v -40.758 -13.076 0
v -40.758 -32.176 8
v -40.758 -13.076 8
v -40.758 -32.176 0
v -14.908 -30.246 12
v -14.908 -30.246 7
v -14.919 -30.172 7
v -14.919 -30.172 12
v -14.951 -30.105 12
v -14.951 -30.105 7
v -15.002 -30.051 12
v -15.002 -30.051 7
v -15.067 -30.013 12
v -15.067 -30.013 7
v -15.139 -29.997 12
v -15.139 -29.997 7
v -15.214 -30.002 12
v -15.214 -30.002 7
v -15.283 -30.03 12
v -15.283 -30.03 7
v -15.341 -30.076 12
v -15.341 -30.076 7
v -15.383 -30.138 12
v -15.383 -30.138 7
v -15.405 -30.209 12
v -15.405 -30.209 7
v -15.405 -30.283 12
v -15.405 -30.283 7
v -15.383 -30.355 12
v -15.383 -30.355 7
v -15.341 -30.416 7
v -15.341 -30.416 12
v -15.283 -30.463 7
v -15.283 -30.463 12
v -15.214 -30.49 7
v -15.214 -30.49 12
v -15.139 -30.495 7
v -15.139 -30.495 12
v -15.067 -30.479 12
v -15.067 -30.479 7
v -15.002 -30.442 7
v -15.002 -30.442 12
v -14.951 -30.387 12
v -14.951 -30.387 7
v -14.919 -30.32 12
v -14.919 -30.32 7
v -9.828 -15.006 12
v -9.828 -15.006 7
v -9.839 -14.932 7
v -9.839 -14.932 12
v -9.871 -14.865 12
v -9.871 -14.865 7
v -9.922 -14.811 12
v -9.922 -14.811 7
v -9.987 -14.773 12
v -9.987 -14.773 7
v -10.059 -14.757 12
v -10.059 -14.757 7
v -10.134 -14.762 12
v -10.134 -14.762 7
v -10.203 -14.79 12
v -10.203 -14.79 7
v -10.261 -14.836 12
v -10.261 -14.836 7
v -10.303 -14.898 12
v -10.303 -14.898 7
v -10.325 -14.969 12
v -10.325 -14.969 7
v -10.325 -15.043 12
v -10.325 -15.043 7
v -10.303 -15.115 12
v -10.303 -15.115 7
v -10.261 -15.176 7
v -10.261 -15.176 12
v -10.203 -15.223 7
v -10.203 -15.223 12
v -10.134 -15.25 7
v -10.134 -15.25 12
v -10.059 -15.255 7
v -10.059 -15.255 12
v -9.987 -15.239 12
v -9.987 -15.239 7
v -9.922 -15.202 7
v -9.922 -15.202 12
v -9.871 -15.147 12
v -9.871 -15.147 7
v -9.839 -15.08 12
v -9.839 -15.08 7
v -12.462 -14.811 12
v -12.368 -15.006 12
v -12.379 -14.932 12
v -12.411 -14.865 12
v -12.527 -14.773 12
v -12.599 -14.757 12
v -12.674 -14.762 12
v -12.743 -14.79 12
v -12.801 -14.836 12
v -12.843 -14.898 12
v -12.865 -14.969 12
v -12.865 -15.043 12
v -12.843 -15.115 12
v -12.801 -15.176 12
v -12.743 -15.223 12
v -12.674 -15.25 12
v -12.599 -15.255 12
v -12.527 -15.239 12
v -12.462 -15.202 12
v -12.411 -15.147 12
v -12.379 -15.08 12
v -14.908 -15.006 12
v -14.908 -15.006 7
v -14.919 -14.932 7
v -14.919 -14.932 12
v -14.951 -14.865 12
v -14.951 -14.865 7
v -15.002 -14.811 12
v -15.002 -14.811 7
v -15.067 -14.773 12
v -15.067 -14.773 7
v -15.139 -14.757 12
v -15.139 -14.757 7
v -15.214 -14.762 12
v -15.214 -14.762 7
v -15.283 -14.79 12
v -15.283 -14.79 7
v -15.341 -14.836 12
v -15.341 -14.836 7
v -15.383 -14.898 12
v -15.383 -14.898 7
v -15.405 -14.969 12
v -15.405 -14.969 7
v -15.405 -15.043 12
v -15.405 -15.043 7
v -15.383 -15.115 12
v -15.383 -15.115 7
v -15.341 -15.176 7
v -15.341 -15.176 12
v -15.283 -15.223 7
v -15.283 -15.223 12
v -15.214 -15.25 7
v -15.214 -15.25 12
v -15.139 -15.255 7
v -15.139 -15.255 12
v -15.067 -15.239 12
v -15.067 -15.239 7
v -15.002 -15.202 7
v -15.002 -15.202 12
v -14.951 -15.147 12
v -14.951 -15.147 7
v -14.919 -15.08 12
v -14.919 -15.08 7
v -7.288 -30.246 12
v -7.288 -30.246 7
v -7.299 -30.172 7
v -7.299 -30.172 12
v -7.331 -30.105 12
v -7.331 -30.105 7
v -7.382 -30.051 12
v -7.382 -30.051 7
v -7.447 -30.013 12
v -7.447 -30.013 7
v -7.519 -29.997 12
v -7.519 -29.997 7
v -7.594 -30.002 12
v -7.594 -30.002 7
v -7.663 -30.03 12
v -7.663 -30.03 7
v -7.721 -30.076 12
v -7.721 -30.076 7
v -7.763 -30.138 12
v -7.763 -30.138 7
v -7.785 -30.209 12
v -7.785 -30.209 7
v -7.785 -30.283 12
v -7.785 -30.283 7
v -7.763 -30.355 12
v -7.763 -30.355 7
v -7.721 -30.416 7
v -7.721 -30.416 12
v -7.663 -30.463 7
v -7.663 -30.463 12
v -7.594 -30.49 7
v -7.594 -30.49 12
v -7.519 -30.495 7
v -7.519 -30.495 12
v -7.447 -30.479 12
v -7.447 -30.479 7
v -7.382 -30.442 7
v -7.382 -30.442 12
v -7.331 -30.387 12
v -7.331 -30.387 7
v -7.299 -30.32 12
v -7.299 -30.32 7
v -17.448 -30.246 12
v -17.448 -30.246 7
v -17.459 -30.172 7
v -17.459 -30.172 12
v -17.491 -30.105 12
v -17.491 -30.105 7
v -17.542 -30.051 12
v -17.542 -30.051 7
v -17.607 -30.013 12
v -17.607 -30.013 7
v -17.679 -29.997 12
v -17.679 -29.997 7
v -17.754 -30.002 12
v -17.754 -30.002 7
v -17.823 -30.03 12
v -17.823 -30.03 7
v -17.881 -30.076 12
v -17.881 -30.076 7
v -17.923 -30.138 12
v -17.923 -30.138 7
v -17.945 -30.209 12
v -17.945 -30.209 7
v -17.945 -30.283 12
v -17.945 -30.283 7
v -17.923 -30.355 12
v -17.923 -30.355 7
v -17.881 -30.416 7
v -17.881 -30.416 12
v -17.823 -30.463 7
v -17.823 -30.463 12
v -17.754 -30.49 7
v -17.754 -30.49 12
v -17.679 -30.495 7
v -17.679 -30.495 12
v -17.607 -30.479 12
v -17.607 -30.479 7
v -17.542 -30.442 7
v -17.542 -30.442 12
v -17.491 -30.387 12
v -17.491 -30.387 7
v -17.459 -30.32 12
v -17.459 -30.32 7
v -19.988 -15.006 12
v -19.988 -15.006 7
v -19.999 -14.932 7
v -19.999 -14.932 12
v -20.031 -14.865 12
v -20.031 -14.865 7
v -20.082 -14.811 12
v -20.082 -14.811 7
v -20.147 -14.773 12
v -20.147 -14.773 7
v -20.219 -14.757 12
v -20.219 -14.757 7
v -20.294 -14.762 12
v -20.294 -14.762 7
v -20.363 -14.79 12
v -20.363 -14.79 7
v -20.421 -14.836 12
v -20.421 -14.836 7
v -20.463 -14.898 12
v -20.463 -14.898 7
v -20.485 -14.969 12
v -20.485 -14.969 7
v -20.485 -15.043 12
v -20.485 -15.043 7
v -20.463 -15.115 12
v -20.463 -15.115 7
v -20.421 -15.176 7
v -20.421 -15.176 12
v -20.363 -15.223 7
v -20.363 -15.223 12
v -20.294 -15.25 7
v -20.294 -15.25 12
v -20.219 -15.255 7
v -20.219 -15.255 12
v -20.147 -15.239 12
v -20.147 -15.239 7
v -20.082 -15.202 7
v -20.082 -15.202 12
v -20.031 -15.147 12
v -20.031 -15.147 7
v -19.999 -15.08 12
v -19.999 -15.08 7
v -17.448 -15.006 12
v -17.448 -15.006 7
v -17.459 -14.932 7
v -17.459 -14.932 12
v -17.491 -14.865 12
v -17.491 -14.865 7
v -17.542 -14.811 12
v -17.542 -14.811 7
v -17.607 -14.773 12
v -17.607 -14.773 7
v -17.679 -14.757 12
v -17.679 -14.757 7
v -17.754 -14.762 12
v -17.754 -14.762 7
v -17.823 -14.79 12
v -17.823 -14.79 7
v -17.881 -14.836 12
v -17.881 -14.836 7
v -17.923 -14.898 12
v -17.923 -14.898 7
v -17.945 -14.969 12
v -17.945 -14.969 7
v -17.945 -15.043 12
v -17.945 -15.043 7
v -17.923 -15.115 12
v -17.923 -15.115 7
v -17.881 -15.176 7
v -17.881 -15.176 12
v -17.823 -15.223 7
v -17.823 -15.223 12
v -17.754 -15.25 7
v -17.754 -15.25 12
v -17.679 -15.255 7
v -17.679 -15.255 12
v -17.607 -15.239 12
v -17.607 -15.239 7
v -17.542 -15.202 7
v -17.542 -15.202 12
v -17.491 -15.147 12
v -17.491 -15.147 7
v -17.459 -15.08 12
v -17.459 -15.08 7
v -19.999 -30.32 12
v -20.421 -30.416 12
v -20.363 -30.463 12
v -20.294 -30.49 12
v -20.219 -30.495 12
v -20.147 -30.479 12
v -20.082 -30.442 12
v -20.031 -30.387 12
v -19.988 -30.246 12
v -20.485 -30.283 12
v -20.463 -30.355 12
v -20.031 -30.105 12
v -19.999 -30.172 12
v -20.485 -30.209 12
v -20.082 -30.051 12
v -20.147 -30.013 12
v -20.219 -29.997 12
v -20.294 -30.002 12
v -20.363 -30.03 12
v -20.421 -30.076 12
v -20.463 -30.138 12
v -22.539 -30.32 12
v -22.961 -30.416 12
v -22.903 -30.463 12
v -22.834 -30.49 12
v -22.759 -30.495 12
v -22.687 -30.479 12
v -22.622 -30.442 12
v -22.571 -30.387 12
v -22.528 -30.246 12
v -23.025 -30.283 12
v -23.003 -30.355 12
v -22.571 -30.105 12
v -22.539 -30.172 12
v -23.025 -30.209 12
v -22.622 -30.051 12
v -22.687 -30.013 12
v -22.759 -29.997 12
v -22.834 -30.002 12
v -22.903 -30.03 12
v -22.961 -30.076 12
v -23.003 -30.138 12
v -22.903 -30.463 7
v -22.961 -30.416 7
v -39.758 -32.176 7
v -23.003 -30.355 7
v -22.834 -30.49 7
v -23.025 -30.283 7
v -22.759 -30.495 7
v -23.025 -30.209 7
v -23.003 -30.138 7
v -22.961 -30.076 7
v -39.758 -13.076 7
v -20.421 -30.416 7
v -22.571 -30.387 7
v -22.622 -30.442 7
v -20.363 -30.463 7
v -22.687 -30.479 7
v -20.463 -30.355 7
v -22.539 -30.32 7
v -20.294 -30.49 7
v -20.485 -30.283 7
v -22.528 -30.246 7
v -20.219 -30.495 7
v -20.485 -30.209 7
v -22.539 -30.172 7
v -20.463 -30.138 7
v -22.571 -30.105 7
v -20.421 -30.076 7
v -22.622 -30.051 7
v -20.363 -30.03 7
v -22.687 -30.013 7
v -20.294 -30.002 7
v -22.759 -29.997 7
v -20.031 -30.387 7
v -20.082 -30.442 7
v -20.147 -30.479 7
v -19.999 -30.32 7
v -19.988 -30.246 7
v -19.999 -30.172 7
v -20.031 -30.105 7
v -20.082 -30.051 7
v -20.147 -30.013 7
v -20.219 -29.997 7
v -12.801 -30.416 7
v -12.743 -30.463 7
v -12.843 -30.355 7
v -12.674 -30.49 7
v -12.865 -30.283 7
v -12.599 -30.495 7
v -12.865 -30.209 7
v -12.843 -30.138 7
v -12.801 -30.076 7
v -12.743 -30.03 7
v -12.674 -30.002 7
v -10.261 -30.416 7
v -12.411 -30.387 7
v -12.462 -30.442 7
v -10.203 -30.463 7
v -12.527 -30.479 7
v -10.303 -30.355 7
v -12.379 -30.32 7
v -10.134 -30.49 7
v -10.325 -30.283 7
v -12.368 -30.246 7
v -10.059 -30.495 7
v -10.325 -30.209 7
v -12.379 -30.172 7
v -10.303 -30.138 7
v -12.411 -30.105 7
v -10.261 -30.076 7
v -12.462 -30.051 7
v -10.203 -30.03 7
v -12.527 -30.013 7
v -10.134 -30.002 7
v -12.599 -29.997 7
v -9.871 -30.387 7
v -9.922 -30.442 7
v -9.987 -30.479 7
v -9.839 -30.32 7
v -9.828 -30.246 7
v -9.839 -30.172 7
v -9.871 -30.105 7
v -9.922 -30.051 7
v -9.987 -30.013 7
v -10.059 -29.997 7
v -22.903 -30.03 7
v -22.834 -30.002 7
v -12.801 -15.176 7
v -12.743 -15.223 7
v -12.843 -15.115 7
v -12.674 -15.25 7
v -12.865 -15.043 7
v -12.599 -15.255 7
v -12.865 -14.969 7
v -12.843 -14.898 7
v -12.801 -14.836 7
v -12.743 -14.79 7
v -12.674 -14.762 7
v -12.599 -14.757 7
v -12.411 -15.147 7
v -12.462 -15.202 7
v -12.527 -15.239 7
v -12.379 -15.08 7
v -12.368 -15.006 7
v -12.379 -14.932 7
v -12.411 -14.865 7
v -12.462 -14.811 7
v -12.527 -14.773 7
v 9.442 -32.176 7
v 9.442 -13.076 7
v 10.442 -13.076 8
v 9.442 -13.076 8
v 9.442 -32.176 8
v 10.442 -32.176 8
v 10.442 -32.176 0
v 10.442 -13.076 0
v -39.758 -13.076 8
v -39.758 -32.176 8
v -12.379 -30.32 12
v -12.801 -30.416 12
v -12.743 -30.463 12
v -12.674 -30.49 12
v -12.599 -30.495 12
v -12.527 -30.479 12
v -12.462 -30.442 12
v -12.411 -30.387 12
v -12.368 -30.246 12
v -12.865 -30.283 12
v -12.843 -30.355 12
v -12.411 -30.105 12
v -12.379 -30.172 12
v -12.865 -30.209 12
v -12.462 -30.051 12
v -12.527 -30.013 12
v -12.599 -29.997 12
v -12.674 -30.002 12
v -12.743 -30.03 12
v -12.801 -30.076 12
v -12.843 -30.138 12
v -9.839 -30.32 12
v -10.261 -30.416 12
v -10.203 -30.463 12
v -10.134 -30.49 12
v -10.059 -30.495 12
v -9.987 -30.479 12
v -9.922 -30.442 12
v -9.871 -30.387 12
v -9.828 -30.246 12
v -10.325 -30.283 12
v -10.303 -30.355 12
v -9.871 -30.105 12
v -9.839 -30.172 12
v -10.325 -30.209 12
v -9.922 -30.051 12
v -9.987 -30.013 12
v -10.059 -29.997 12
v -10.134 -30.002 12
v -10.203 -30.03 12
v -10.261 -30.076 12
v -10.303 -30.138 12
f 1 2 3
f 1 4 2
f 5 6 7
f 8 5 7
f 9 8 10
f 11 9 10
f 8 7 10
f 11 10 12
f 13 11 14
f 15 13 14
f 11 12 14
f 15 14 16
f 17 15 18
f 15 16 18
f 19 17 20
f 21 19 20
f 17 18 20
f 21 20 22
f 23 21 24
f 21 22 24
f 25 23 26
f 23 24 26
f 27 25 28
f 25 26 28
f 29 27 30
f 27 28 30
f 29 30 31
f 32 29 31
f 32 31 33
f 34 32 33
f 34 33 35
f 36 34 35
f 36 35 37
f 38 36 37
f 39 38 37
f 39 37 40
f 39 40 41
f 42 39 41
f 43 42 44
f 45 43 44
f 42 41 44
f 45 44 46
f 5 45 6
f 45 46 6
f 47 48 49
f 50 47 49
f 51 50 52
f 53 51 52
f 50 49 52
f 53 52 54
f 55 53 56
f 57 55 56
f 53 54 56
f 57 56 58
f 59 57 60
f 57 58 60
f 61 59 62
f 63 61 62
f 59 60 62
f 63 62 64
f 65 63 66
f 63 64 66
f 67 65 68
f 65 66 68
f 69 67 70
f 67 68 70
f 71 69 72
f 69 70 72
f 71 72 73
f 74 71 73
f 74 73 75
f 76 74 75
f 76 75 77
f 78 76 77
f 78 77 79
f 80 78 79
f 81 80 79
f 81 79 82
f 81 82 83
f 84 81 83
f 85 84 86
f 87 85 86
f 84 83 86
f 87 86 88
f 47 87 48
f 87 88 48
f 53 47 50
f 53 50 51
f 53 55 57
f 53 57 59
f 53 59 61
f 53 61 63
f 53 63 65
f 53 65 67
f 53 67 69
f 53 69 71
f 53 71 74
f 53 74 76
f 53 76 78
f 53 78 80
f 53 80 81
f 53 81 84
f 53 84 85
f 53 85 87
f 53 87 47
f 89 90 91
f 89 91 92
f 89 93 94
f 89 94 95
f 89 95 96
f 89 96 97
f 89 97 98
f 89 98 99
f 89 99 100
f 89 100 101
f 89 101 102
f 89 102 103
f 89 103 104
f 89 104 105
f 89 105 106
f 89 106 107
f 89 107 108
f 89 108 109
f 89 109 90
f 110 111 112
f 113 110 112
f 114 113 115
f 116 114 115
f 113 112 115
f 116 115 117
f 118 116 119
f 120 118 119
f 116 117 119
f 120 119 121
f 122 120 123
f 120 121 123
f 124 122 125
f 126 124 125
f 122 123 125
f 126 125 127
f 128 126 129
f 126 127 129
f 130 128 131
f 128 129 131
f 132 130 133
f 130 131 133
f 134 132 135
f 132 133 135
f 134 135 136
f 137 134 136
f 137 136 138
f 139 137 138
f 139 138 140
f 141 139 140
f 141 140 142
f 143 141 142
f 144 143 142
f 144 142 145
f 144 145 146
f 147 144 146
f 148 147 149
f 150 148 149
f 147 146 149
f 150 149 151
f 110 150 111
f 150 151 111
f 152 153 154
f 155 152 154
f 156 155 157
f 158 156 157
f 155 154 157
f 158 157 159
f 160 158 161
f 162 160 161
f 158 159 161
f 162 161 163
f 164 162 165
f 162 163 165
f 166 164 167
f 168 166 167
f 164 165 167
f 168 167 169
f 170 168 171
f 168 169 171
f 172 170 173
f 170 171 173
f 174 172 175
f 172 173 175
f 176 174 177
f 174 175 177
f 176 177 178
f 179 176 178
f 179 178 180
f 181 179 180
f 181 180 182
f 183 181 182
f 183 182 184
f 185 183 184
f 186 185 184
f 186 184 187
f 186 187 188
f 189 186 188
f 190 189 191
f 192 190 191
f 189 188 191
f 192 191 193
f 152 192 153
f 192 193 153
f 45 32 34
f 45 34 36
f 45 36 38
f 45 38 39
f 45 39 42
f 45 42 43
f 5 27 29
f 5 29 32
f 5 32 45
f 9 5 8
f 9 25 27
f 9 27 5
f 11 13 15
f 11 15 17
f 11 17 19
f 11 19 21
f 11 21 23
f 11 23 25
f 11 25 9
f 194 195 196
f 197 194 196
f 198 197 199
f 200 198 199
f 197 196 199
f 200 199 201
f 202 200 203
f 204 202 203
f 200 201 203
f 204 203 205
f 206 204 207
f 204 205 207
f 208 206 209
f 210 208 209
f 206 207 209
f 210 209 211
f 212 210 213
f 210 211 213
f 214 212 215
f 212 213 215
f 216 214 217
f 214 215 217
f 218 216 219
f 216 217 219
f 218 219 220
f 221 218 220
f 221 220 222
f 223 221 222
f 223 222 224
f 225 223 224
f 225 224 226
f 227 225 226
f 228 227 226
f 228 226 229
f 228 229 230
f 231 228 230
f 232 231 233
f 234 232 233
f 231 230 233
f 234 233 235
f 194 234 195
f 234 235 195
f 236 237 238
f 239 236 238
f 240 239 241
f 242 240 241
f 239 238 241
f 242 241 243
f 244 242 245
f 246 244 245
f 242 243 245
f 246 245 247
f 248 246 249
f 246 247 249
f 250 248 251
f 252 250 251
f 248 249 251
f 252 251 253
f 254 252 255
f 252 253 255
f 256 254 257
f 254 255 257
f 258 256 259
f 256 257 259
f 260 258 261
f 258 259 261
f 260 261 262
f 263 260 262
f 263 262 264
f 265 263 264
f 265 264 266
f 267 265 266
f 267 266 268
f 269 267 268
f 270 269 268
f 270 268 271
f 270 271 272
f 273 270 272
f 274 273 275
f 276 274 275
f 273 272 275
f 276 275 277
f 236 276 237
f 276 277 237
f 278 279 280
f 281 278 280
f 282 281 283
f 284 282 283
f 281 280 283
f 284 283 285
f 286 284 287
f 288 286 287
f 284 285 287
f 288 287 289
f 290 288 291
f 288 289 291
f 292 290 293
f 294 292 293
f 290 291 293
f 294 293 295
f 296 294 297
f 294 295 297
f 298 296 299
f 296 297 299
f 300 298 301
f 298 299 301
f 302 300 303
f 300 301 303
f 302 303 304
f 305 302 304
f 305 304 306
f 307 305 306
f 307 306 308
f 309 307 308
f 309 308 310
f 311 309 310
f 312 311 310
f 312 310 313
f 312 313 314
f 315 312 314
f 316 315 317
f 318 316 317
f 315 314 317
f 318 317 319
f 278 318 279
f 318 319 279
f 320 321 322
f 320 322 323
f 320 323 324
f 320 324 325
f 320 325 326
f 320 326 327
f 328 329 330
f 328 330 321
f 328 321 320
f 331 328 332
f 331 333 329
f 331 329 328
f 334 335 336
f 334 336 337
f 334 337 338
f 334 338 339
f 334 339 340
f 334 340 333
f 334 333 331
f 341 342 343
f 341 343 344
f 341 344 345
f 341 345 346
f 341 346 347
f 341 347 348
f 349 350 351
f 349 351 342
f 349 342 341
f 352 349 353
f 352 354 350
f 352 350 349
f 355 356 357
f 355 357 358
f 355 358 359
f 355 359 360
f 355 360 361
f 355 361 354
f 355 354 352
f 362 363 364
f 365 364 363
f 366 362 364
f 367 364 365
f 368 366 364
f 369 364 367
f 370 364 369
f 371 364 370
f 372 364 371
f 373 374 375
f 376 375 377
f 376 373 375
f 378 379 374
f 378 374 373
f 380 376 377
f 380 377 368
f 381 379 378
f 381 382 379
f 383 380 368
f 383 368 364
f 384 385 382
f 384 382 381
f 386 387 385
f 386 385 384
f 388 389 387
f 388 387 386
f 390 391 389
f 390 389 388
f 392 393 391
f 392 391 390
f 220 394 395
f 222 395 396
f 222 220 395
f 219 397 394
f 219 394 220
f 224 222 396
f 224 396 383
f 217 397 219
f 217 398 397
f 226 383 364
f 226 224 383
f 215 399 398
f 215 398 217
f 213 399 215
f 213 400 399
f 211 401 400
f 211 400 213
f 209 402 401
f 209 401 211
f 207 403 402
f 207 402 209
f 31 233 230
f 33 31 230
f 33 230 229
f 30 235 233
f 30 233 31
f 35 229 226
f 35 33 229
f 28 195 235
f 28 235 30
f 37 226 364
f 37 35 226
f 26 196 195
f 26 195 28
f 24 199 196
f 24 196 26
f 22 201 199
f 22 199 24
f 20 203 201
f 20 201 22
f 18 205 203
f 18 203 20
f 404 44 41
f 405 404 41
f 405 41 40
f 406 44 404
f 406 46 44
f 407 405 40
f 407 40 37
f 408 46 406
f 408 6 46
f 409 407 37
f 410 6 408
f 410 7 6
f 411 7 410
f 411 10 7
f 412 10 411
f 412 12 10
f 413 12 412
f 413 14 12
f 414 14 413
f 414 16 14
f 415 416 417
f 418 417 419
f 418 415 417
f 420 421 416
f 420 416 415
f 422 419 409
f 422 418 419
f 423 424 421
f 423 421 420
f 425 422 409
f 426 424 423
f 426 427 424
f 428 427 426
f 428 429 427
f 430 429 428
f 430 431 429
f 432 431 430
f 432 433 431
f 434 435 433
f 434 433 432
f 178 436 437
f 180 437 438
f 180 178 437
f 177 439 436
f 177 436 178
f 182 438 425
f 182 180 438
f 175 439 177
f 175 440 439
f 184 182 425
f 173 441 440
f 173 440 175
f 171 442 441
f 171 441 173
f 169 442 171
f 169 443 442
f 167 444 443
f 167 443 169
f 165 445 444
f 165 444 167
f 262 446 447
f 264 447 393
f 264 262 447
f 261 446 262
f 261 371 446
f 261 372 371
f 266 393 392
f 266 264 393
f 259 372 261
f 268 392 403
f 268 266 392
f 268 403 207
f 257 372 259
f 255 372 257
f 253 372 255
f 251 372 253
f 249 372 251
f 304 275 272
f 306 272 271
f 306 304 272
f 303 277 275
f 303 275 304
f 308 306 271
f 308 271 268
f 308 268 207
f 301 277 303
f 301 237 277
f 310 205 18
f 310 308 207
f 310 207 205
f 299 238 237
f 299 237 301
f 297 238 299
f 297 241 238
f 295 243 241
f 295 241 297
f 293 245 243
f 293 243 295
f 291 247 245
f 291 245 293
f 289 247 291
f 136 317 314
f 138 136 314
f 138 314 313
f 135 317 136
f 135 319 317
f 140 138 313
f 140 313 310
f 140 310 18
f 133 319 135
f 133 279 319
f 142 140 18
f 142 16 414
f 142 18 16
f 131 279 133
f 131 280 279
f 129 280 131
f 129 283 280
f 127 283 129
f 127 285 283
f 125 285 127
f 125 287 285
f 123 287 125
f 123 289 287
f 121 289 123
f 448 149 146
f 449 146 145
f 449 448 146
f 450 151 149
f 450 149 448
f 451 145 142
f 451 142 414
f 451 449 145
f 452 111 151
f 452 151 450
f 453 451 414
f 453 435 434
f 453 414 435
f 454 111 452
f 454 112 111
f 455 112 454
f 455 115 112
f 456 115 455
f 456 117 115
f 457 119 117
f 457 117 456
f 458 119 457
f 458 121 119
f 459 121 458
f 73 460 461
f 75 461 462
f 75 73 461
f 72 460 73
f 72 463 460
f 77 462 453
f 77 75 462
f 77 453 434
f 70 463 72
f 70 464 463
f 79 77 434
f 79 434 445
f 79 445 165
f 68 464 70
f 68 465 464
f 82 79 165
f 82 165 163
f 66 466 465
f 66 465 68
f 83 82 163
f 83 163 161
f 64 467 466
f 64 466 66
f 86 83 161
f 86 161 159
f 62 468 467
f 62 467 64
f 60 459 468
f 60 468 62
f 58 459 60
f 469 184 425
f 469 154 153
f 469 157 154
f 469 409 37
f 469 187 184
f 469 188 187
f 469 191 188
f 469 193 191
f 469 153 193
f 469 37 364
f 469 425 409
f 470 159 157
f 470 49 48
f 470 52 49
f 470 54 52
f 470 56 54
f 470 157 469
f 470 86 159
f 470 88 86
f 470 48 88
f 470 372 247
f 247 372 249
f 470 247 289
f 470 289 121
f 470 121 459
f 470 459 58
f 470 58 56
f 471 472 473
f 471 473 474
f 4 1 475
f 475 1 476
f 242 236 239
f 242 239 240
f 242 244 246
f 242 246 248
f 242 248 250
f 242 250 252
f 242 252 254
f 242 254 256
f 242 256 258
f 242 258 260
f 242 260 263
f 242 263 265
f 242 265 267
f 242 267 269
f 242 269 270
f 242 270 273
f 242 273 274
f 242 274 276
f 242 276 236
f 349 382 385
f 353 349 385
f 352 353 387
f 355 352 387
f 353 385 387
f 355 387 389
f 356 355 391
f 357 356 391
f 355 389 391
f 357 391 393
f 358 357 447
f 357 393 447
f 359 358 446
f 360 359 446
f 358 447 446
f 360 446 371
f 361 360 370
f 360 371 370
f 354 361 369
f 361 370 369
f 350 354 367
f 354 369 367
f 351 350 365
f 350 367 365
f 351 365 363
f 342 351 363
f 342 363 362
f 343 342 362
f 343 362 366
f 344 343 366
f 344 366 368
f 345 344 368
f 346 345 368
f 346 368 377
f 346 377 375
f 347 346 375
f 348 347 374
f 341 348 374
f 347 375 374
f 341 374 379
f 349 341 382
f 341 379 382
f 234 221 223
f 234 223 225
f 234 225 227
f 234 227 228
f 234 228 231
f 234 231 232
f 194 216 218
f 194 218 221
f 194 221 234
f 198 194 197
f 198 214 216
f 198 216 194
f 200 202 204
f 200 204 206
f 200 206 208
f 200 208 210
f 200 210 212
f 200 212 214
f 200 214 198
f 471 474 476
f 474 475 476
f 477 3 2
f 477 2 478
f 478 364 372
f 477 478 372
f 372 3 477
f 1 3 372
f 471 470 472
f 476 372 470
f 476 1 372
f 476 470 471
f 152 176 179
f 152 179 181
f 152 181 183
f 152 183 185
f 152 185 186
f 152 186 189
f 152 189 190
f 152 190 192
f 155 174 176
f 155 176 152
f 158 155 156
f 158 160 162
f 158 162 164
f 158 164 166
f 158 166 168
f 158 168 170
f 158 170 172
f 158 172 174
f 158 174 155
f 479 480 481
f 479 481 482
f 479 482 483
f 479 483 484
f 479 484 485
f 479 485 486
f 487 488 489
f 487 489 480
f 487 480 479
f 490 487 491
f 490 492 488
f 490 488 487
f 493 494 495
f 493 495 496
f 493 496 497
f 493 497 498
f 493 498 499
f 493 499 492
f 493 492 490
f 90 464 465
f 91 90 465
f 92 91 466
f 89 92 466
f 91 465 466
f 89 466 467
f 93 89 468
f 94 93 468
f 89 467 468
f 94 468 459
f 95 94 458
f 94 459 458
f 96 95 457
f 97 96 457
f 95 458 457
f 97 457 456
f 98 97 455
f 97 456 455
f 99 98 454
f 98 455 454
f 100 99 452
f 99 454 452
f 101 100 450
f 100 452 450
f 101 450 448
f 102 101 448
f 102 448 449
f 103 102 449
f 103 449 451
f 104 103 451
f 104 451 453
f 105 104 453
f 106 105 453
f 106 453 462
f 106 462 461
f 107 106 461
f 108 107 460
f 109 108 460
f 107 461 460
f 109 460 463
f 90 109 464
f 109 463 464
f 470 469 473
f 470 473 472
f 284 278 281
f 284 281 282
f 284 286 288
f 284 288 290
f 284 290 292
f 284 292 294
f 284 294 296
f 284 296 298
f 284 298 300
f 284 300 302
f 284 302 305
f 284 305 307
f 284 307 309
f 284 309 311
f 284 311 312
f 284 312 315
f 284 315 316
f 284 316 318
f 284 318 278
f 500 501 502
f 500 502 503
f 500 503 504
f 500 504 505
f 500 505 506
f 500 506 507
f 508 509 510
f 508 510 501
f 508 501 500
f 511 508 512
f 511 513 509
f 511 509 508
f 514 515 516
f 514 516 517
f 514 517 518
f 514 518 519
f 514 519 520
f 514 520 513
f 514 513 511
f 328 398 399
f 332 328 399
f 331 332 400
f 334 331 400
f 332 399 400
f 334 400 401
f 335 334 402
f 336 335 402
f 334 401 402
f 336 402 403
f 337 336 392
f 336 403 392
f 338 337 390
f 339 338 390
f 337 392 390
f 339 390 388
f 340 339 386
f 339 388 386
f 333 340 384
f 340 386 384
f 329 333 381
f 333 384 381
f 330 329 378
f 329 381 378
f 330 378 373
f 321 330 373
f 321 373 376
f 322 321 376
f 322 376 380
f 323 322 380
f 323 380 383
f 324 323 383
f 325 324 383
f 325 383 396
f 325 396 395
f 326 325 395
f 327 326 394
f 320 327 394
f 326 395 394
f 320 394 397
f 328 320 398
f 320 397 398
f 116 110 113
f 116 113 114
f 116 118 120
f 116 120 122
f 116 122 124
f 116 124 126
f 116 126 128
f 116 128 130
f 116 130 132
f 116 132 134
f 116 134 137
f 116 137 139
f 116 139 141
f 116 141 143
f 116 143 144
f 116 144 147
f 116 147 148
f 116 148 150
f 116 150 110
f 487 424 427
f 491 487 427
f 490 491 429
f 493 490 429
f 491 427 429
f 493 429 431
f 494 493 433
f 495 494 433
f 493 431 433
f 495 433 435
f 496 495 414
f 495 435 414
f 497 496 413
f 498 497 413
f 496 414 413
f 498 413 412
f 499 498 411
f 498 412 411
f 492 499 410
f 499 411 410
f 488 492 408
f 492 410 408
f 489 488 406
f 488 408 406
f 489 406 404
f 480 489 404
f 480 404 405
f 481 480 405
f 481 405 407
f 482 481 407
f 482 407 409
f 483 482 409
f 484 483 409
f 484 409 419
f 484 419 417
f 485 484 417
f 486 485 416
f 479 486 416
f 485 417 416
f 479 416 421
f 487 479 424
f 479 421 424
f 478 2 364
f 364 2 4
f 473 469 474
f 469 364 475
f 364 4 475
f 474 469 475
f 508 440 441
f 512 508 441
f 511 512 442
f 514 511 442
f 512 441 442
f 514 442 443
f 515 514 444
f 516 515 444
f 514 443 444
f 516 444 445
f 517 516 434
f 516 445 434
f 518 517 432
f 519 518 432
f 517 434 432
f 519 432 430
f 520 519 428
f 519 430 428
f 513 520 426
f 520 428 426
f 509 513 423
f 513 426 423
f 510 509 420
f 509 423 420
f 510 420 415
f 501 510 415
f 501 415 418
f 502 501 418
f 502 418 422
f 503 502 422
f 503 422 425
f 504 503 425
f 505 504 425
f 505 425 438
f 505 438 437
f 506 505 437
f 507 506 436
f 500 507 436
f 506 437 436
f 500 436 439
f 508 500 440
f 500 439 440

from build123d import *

# Parameters (mm, degrees)
F0_W     = 51.2
F0_H     = 19.1
F1_DEPTH = 7
F3_W     = 1
F3_H     = 19.1
F4_DEPTH = 1
F5_W     = 1
F5_H     = 19.1
F6_DEPTH = 1
F7_R     = 0.25
F8_DEPTH = 5


with BuildPart() as f1:
    # F0 (on Top) → F1 (new body)
    with BuildSketch(Plane.XY):
        with Locations((-15.157956, -22.626161)):
            Rectangle(F0_W, F0_H)
    extrude(amount=F1_DEPTH)

    # F3 (on face) → F4 (join)
    with BuildSketch(Plane.XY.offset(7)):
        with Locations((-40.257956, -22.626161)):
            Rectangle(F3_W, F3_H)
    extrude(amount=F4_DEPTH)

    # F5 (on face) → F6 (join)
    with BuildSketch(Plane.XY.offset(7)):
        with Locations((9.942044, -22.626161)):
            Rectangle(F5_W, F5_H)
    extrude(amount=F6_DEPTH)

    # F7 (on face) → F8 (join)
    with BuildSketch(Plane.XY.offset(7)):
        with Locations((-15.157956, -15.006161)):
            Circle(F7_R)
        with Locations((-15.157956, -30.246161)):
            Circle(F7_R)
        with Locations((-12.617956, -15.006161)):
            Circle(F7_R)
        with Locations((-10.077956, -15.006161)):
            Circle(F7_R)
        with Locations((-17.697956, -15.006161)):
            Circle(F7_R)
        with Locations((-20.237956, -15.006161)):
            Circle(F7_R)
        with Locations((-12.617956, -30.246161)):
            Circle(F7_R)
        with Locations((-10.077956, -30.246161)):
            Circle(F7_R)
        with Locations((-7.537956, -30.246161)):
            Circle(F7_R)
        with Locations((-17.697956, -30.246161)):
            Circle(F7_R)
        with Locations((-20.237956, -30.246161)):
            Circle(F7_R)
        with Locations((-22.777956, -30.246161)):
            Circle(F7_R)
    extrude(amount=F8_DEPTH)


solid = f1.part
